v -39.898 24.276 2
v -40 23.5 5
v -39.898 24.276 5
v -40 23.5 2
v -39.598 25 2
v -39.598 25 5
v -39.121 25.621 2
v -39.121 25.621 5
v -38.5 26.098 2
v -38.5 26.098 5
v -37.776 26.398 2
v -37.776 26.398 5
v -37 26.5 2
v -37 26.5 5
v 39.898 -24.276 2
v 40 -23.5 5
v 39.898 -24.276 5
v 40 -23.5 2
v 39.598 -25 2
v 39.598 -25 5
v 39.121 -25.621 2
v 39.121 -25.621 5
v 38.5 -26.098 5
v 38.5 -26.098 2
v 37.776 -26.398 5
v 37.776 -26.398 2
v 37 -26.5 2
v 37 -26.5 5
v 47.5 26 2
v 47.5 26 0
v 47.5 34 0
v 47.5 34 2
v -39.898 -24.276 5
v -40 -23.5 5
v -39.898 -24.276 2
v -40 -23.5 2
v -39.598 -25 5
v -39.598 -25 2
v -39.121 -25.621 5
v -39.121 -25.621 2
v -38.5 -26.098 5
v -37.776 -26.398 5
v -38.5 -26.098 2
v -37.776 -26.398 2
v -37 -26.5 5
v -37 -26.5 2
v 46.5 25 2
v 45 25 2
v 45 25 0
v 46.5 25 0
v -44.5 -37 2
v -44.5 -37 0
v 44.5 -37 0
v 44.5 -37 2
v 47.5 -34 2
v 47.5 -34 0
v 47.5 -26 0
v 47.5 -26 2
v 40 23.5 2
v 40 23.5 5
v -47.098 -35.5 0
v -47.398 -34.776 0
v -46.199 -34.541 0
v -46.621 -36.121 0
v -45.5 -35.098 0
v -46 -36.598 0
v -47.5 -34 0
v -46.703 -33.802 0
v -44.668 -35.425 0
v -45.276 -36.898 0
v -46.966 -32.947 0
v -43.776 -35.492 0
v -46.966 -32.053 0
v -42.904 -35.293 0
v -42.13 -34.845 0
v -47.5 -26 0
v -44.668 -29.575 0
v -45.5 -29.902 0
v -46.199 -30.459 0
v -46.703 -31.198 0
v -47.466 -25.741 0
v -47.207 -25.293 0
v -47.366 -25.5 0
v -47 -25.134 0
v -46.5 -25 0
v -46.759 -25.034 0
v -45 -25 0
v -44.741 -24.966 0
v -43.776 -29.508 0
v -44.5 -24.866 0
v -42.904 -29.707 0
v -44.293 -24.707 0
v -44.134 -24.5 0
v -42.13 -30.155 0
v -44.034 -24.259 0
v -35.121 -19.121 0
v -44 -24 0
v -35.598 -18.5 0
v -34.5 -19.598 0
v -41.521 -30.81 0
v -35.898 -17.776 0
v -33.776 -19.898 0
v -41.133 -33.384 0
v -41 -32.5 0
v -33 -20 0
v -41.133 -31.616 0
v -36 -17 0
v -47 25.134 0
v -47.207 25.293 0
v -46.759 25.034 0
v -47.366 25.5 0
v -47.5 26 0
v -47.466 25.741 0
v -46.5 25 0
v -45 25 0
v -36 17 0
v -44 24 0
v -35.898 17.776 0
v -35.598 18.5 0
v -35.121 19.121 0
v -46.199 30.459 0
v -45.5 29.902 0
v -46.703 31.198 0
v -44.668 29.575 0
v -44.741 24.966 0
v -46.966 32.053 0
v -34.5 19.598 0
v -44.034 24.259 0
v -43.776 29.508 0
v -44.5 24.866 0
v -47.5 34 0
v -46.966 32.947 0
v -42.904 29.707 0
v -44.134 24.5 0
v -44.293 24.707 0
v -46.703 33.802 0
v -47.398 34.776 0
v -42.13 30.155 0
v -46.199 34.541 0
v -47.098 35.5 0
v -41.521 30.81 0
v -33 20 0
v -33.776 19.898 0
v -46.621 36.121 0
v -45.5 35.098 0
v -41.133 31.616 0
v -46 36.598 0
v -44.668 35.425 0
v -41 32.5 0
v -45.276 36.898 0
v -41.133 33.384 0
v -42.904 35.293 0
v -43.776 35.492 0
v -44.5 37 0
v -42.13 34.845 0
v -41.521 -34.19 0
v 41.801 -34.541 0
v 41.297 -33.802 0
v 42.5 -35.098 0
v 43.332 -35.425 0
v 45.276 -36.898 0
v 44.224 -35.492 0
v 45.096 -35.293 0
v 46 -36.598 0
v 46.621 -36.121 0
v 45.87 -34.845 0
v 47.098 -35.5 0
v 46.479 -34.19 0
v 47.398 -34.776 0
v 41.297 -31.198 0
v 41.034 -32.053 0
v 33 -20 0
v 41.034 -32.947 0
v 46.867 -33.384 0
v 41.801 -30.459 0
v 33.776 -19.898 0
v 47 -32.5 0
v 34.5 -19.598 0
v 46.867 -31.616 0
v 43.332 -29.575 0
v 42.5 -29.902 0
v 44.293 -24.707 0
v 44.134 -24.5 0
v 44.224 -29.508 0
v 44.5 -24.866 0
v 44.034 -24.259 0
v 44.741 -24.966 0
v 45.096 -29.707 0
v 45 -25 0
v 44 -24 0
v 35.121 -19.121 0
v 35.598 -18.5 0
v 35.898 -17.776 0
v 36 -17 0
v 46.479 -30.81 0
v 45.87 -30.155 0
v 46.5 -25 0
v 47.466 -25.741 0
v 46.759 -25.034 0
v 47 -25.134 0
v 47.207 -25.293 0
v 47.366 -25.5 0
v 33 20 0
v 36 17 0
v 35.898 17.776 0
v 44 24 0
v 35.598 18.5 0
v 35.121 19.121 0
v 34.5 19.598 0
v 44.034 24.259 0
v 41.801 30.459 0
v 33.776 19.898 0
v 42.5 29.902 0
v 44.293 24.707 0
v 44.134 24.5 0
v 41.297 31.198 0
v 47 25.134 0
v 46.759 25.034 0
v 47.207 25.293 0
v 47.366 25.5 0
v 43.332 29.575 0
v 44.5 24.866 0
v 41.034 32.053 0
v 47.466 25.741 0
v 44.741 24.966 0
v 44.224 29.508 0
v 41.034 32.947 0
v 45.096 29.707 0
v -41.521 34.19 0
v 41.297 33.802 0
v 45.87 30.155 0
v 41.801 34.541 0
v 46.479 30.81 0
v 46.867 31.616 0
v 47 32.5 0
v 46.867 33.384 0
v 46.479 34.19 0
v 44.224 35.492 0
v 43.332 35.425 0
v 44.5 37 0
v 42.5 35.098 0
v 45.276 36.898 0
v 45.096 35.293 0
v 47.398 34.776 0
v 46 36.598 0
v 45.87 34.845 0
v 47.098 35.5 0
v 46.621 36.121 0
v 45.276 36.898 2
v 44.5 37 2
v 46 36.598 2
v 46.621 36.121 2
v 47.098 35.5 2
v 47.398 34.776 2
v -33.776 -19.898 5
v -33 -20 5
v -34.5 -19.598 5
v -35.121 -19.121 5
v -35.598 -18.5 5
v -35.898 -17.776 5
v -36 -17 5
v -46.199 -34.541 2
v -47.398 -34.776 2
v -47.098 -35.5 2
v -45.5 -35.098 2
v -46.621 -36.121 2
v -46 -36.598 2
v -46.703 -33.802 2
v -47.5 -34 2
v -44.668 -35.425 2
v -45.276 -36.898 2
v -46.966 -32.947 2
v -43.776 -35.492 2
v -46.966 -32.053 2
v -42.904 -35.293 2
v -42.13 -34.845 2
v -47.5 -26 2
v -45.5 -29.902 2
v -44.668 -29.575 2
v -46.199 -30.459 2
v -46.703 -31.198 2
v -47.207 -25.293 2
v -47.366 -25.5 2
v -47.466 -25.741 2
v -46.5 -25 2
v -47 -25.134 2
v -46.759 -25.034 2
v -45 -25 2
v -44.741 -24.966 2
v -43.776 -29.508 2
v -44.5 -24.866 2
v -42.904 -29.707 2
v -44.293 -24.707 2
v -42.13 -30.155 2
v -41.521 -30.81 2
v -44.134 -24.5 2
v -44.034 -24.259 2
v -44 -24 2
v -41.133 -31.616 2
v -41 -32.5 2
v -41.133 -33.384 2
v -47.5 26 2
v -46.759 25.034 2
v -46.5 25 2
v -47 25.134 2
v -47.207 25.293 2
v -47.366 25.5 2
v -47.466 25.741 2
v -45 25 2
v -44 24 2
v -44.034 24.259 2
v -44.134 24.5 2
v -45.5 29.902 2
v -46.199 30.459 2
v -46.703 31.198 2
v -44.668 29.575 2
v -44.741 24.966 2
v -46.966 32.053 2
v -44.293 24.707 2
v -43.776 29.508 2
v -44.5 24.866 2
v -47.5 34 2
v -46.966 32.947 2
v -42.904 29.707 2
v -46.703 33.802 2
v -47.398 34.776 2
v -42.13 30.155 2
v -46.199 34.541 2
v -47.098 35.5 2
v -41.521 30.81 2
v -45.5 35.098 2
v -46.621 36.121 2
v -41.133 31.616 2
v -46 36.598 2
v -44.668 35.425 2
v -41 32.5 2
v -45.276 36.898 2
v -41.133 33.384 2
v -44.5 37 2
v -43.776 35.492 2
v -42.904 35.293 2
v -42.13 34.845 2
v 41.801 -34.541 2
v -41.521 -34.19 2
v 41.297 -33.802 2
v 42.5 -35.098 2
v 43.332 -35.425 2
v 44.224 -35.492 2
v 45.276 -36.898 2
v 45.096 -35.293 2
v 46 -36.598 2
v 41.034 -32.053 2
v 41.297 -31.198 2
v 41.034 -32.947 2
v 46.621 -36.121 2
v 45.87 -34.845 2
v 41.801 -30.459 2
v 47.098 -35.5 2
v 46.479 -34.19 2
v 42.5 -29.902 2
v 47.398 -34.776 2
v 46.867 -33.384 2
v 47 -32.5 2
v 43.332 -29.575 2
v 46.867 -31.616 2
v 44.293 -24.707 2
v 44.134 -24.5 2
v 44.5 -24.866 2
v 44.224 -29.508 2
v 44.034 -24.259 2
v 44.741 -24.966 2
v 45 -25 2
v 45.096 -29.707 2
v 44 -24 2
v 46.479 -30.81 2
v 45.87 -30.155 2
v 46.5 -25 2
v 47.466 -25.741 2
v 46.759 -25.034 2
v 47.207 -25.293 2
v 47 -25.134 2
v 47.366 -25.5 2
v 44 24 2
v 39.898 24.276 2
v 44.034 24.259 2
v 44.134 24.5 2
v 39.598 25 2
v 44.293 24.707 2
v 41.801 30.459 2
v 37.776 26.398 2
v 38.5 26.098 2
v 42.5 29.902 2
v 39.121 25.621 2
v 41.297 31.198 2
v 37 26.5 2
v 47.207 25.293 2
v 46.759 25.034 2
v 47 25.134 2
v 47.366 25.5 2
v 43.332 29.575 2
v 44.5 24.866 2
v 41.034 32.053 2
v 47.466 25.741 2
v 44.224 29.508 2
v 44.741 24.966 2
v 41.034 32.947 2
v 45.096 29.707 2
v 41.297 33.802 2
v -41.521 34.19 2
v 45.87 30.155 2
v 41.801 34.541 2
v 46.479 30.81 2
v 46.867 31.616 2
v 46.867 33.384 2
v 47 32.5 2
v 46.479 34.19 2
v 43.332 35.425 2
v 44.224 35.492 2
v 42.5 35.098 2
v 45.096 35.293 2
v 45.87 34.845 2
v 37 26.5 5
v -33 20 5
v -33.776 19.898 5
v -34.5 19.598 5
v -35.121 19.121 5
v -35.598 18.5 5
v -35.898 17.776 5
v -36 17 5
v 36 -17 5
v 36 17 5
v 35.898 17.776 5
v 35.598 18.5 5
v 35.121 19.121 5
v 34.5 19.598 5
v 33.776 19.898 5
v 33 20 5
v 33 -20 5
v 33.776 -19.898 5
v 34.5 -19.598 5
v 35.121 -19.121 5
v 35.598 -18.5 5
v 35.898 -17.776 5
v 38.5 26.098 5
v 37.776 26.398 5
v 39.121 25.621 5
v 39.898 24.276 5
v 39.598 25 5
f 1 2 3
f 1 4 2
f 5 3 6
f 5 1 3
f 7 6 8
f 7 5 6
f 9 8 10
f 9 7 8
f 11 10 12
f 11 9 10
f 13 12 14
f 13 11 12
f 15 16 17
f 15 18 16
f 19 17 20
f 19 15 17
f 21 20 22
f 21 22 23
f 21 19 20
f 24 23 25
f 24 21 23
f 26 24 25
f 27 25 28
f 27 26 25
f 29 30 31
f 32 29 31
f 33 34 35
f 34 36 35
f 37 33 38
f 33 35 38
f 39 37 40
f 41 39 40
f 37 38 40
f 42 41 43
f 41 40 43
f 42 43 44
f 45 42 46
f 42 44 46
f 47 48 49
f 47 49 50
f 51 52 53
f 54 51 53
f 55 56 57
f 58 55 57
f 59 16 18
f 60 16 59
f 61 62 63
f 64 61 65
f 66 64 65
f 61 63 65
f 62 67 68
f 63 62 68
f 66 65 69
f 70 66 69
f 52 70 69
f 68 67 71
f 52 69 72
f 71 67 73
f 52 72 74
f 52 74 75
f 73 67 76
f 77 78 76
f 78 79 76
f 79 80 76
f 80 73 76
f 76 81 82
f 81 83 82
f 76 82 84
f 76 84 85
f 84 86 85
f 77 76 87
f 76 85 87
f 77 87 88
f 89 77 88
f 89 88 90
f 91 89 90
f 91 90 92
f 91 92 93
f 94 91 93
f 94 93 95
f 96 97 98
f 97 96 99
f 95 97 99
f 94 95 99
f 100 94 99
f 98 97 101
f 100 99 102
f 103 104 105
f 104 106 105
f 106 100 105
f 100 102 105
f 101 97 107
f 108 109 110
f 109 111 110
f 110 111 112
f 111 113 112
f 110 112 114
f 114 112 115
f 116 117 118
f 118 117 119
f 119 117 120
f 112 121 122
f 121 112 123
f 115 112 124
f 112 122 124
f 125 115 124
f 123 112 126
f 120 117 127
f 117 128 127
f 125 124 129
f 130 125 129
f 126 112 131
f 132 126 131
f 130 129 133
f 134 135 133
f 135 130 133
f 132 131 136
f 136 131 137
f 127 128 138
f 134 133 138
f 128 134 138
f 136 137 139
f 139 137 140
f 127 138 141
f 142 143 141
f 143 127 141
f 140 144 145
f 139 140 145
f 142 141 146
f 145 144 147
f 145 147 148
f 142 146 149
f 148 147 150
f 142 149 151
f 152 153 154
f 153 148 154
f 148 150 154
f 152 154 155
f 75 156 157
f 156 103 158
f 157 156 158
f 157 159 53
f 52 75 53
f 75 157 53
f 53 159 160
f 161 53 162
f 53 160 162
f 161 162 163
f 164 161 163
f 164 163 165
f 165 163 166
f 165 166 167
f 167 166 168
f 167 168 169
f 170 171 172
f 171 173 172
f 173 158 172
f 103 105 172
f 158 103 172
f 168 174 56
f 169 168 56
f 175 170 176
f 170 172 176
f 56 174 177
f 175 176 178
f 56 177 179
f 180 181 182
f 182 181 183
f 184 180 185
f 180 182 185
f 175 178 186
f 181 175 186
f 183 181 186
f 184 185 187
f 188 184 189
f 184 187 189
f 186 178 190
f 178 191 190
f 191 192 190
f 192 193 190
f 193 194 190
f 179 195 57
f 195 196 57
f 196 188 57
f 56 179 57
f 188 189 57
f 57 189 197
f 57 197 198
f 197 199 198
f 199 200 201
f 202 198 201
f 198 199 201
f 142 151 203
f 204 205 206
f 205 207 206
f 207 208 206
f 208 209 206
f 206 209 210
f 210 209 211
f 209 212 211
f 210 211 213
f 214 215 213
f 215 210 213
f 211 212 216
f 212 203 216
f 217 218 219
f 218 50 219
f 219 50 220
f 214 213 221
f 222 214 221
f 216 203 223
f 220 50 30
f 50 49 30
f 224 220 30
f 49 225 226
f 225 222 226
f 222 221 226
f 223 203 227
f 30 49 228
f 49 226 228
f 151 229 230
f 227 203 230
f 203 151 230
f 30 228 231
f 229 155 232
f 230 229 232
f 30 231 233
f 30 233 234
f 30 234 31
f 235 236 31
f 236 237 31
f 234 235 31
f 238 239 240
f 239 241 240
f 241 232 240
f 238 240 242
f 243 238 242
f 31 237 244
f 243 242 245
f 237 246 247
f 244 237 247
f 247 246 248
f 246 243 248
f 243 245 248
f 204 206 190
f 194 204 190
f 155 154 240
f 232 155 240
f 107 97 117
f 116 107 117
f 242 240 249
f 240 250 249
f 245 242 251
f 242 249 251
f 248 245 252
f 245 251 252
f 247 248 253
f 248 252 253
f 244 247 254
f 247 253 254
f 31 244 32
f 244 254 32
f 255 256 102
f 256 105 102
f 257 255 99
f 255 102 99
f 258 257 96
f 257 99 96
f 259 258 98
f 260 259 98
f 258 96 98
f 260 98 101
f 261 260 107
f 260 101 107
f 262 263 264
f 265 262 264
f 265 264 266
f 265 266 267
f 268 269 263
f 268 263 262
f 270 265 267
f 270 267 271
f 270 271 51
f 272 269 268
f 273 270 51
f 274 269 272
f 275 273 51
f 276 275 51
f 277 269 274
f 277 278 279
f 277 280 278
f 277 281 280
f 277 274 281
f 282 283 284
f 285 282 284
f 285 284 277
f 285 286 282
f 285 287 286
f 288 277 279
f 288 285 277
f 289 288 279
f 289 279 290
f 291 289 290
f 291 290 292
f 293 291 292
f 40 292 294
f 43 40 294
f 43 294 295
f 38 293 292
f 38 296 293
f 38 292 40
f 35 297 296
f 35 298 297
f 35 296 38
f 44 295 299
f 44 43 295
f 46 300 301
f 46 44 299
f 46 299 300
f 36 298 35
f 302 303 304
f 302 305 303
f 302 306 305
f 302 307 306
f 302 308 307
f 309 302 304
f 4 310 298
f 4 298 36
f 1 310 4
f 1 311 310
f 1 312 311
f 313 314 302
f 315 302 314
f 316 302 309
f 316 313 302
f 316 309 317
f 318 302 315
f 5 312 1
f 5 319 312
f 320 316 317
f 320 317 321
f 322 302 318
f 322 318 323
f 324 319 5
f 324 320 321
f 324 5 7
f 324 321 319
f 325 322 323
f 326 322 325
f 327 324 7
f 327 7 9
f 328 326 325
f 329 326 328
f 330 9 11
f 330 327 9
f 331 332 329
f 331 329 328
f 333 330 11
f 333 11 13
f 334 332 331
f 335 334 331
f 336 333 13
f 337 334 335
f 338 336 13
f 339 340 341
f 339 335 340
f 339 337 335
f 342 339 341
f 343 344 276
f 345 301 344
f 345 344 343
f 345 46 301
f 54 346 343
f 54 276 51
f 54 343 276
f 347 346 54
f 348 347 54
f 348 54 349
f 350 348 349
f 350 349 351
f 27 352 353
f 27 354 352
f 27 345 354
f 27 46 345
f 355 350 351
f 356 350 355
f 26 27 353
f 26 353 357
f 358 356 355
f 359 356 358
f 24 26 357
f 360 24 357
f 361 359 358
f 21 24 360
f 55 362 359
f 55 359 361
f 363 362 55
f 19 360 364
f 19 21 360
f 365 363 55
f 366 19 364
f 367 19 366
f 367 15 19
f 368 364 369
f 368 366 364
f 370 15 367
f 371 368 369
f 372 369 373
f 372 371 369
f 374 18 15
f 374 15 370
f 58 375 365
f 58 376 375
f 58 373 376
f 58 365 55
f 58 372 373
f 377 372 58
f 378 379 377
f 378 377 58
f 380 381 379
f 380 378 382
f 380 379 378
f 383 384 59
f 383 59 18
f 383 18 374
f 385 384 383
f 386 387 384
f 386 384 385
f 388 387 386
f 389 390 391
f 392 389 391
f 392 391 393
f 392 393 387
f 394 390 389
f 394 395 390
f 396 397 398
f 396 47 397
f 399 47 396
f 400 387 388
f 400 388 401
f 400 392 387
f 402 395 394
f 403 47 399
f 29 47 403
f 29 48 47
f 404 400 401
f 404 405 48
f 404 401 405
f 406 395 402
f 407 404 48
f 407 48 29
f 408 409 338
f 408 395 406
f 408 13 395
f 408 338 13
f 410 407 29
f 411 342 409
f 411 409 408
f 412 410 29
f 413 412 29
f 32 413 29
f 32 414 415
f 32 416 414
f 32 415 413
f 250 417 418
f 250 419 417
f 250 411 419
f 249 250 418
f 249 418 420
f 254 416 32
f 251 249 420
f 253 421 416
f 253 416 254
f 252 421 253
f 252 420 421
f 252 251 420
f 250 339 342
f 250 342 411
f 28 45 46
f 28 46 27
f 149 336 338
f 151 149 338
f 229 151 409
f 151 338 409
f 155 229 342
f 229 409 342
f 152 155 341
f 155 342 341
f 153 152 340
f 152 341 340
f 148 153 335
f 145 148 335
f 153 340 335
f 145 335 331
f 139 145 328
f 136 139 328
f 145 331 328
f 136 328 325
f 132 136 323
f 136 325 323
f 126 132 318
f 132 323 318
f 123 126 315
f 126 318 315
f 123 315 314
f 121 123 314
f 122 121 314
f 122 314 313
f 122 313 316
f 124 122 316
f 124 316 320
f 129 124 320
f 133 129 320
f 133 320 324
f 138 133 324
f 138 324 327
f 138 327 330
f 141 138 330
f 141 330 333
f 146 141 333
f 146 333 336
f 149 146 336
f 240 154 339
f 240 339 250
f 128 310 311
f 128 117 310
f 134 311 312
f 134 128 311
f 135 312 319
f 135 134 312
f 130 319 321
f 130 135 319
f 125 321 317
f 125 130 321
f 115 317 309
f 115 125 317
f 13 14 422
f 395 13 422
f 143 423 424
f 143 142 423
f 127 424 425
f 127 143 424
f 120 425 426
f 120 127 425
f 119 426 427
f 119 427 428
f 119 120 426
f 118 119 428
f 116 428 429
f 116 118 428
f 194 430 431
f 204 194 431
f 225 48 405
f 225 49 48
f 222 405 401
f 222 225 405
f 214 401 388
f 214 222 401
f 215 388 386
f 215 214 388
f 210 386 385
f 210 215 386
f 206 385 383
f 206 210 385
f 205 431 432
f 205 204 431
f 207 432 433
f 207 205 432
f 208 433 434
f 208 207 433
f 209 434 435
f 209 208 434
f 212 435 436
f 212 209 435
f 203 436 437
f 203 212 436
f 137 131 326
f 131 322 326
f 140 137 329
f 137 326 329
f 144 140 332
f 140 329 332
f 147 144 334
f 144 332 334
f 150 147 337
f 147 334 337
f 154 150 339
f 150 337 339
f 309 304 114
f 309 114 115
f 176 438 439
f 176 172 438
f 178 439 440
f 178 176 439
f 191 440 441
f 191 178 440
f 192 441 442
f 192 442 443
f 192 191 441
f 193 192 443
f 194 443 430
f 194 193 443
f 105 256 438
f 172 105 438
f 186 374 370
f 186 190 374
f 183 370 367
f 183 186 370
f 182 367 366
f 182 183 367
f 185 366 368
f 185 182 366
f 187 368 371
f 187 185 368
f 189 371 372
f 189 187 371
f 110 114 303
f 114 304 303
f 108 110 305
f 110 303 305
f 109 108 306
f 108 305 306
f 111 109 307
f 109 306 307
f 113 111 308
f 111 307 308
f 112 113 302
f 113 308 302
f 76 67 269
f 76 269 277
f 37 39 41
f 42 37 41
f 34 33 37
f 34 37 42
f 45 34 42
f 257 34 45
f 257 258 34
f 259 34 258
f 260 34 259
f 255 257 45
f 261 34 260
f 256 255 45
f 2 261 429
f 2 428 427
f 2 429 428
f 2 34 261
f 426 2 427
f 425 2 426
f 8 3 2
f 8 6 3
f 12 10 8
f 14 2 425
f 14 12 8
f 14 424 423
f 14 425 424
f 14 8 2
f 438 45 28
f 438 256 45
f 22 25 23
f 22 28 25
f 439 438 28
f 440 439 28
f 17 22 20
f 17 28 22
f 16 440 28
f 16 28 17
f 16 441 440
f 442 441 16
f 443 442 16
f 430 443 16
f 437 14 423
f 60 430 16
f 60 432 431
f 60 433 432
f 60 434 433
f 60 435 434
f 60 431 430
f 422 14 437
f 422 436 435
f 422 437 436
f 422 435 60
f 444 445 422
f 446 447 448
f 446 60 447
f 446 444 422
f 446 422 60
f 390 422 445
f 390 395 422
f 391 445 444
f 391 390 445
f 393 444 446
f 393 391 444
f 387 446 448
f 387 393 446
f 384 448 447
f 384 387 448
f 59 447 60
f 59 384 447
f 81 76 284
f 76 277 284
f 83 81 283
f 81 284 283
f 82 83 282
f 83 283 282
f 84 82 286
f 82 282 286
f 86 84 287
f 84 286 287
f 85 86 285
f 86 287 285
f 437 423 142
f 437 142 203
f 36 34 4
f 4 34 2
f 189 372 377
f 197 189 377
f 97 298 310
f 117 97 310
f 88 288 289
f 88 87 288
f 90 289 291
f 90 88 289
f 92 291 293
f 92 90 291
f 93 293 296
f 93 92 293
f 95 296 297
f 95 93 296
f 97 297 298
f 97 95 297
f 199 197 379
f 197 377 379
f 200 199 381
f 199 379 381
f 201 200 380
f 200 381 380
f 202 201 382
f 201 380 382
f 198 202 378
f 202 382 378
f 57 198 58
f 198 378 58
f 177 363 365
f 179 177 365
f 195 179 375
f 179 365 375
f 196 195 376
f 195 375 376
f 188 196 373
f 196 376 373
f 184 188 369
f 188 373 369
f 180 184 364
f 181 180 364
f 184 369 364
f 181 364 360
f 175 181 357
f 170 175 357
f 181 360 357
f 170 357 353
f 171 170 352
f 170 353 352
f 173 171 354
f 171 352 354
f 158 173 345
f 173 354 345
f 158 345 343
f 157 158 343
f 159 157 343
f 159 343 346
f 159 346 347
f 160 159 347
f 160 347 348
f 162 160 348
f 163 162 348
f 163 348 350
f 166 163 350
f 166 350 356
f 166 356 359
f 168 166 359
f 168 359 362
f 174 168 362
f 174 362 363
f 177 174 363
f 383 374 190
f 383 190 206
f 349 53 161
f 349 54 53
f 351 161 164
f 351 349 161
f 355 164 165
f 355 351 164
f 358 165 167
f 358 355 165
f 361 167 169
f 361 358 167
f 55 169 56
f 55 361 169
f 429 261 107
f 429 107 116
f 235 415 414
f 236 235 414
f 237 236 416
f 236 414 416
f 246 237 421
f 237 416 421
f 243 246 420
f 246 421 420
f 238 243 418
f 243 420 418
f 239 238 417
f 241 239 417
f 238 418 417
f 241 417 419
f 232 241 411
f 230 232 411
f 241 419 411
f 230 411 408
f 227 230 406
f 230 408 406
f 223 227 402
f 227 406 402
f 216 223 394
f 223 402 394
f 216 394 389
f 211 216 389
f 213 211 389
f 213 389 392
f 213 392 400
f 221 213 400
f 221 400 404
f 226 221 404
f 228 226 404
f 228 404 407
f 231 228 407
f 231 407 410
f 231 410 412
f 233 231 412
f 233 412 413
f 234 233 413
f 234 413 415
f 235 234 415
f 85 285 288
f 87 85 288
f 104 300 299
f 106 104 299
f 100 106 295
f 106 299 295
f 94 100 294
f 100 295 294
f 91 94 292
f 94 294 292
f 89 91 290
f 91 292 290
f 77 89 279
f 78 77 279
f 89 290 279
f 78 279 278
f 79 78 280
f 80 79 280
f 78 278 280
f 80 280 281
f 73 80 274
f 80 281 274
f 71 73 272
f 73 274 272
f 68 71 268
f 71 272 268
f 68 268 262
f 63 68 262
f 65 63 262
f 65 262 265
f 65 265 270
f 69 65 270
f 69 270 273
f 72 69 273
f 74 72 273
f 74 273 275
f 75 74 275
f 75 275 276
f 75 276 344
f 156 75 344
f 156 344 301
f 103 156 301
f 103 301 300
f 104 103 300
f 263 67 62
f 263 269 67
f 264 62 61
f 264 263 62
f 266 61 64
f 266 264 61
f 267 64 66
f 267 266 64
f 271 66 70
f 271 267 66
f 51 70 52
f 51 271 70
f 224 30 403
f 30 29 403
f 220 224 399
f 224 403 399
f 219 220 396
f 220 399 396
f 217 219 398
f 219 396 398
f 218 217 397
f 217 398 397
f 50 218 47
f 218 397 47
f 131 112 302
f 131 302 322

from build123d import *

# Parameters (mm, degrees)
SKETCH_W        = 95
SKETCH_H        = 74
PAD_DEPTH       = 5
SKETCH002_W     = 72
SKETCH002_H     = 40
POCKET_DEPTH    = 5.001
SKETCH004_W     = 117.661896
SKETCH004_H     = 92.433091
SKETCH004_W_2   = 80
SKETCH004_H_2   = 53
POCKET001_DEPTH = 3
FILLET_R        = 3
FILLET001_R     = 3
SKETCH005_R     = 3
POCKET002_DEPTH = 5
SKETCH006_W     = 5.477936
SKETCH006_H     = 50
SKETCH006_W_2   = 5.931454
POCKET003_DEPTH = 5
FILLET002_R     = 1


with BuildPart() as part:
    # Sketch → Pad (new body)
    with BuildSketch(Plane.XY):
        Rectangle(SKETCH_W, SKETCH_H)
    extrude(amount=PAD_DEPTH)

    # Sketch002 → Pocket (cut, through all)
    with BuildSketch(Plane.XY.offset(5)):
        Rectangle(SKETCH002_W, SKETCH002_H)
    extrude(amount=-POCKET_DEPTH, mode=Mode.SUBTRACT)

    # Sketch004 → Pocket001 (cut)
    with BuildSketch(Plane.XY.offset(5)):
        with Locations((-1.857784, 0.611237)):
            Rectangle(SKETCH004_W, SKETCH004_H)
        Rectangle(SKETCH004_W_2, SKETCH004_H_2, mode=Mode.SUBTRACT)
    extrude(amount=-POCKET001_DEPTH, mode=Mode.SUBTRACT)

    # Fillet
    fillet_edges = [part.edges().sort_by_distance(p)[0] for p in [
        (-36, 20, 2.5),
        (36, 20, 2.5),
        (36, -20, 2.5),
        (-36, -20, 2.5),
    ]]
    fillet(fillet_edges, radius=FILLET_R)

    # Fillet001
    fillet001_edges = [part.edges().sort_by_distance(p)[0] for p in [
        (40, 26.5, 3.5),
        (47.5, 37, 1),
        (47.5, -37, 1),
        (40, -26.5, 3.5),
        (-47.5, -37, 1),
        (-40, -26.5, 3.5),
        (-40, 26.5, 3.5),
        (-47.5, 37, 1),
    ]]
    fillet(fillet001_edges, radius=FILLET001_R)

    # Sketch005 → Pocket002 (cut)
    with BuildSketch(Plane.XY.offset(2)):
        with Locations((-44, 32.5)):
            Circle(SKETCH005_R)
        with Locations((44, 32.5)):
            Circle(SKETCH005_R)
        with Locations((44, -32.5)):
            Circle(SKETCH005_R)
        with Locations((-44, -32.5)):
            Circle(SKETCH005_R)
    extrude(amount=-POCKET002_DEPTH, mode=Mode.SUBTRACT)

    # Sketch006 → Pocket003 (cut)
    with BuildSketch(Plane.XY.offset(2)):
        with Locations((46.738968, 0)):
            Rectangle(SKETCH006_W, SKETCH006_H)
        with Locations((-46.965727, 0)):
            Rectangle(SKETCH006_W_2, SKETCH006_H)
    extrude(amount=-POCKET003_DEPTH, mode=Mode.SUBTRACT)

    # Fillet002
    fillet002_edges = [part.edges().sort_by_distance(p)[0] for p in [
        (-47.5, 25, 1),
        (-44, 25, 1),
        (-44, -25, 1),
        (-47.5, -25, 1),
        (47.5, -25, 1),
        (44, -25, 1),
        (44, 25, 1),
        (47.5, 25, 1),
    ]]
    fillet(fillet002_edges, radius=FILLET002_R)


solid = part.part
